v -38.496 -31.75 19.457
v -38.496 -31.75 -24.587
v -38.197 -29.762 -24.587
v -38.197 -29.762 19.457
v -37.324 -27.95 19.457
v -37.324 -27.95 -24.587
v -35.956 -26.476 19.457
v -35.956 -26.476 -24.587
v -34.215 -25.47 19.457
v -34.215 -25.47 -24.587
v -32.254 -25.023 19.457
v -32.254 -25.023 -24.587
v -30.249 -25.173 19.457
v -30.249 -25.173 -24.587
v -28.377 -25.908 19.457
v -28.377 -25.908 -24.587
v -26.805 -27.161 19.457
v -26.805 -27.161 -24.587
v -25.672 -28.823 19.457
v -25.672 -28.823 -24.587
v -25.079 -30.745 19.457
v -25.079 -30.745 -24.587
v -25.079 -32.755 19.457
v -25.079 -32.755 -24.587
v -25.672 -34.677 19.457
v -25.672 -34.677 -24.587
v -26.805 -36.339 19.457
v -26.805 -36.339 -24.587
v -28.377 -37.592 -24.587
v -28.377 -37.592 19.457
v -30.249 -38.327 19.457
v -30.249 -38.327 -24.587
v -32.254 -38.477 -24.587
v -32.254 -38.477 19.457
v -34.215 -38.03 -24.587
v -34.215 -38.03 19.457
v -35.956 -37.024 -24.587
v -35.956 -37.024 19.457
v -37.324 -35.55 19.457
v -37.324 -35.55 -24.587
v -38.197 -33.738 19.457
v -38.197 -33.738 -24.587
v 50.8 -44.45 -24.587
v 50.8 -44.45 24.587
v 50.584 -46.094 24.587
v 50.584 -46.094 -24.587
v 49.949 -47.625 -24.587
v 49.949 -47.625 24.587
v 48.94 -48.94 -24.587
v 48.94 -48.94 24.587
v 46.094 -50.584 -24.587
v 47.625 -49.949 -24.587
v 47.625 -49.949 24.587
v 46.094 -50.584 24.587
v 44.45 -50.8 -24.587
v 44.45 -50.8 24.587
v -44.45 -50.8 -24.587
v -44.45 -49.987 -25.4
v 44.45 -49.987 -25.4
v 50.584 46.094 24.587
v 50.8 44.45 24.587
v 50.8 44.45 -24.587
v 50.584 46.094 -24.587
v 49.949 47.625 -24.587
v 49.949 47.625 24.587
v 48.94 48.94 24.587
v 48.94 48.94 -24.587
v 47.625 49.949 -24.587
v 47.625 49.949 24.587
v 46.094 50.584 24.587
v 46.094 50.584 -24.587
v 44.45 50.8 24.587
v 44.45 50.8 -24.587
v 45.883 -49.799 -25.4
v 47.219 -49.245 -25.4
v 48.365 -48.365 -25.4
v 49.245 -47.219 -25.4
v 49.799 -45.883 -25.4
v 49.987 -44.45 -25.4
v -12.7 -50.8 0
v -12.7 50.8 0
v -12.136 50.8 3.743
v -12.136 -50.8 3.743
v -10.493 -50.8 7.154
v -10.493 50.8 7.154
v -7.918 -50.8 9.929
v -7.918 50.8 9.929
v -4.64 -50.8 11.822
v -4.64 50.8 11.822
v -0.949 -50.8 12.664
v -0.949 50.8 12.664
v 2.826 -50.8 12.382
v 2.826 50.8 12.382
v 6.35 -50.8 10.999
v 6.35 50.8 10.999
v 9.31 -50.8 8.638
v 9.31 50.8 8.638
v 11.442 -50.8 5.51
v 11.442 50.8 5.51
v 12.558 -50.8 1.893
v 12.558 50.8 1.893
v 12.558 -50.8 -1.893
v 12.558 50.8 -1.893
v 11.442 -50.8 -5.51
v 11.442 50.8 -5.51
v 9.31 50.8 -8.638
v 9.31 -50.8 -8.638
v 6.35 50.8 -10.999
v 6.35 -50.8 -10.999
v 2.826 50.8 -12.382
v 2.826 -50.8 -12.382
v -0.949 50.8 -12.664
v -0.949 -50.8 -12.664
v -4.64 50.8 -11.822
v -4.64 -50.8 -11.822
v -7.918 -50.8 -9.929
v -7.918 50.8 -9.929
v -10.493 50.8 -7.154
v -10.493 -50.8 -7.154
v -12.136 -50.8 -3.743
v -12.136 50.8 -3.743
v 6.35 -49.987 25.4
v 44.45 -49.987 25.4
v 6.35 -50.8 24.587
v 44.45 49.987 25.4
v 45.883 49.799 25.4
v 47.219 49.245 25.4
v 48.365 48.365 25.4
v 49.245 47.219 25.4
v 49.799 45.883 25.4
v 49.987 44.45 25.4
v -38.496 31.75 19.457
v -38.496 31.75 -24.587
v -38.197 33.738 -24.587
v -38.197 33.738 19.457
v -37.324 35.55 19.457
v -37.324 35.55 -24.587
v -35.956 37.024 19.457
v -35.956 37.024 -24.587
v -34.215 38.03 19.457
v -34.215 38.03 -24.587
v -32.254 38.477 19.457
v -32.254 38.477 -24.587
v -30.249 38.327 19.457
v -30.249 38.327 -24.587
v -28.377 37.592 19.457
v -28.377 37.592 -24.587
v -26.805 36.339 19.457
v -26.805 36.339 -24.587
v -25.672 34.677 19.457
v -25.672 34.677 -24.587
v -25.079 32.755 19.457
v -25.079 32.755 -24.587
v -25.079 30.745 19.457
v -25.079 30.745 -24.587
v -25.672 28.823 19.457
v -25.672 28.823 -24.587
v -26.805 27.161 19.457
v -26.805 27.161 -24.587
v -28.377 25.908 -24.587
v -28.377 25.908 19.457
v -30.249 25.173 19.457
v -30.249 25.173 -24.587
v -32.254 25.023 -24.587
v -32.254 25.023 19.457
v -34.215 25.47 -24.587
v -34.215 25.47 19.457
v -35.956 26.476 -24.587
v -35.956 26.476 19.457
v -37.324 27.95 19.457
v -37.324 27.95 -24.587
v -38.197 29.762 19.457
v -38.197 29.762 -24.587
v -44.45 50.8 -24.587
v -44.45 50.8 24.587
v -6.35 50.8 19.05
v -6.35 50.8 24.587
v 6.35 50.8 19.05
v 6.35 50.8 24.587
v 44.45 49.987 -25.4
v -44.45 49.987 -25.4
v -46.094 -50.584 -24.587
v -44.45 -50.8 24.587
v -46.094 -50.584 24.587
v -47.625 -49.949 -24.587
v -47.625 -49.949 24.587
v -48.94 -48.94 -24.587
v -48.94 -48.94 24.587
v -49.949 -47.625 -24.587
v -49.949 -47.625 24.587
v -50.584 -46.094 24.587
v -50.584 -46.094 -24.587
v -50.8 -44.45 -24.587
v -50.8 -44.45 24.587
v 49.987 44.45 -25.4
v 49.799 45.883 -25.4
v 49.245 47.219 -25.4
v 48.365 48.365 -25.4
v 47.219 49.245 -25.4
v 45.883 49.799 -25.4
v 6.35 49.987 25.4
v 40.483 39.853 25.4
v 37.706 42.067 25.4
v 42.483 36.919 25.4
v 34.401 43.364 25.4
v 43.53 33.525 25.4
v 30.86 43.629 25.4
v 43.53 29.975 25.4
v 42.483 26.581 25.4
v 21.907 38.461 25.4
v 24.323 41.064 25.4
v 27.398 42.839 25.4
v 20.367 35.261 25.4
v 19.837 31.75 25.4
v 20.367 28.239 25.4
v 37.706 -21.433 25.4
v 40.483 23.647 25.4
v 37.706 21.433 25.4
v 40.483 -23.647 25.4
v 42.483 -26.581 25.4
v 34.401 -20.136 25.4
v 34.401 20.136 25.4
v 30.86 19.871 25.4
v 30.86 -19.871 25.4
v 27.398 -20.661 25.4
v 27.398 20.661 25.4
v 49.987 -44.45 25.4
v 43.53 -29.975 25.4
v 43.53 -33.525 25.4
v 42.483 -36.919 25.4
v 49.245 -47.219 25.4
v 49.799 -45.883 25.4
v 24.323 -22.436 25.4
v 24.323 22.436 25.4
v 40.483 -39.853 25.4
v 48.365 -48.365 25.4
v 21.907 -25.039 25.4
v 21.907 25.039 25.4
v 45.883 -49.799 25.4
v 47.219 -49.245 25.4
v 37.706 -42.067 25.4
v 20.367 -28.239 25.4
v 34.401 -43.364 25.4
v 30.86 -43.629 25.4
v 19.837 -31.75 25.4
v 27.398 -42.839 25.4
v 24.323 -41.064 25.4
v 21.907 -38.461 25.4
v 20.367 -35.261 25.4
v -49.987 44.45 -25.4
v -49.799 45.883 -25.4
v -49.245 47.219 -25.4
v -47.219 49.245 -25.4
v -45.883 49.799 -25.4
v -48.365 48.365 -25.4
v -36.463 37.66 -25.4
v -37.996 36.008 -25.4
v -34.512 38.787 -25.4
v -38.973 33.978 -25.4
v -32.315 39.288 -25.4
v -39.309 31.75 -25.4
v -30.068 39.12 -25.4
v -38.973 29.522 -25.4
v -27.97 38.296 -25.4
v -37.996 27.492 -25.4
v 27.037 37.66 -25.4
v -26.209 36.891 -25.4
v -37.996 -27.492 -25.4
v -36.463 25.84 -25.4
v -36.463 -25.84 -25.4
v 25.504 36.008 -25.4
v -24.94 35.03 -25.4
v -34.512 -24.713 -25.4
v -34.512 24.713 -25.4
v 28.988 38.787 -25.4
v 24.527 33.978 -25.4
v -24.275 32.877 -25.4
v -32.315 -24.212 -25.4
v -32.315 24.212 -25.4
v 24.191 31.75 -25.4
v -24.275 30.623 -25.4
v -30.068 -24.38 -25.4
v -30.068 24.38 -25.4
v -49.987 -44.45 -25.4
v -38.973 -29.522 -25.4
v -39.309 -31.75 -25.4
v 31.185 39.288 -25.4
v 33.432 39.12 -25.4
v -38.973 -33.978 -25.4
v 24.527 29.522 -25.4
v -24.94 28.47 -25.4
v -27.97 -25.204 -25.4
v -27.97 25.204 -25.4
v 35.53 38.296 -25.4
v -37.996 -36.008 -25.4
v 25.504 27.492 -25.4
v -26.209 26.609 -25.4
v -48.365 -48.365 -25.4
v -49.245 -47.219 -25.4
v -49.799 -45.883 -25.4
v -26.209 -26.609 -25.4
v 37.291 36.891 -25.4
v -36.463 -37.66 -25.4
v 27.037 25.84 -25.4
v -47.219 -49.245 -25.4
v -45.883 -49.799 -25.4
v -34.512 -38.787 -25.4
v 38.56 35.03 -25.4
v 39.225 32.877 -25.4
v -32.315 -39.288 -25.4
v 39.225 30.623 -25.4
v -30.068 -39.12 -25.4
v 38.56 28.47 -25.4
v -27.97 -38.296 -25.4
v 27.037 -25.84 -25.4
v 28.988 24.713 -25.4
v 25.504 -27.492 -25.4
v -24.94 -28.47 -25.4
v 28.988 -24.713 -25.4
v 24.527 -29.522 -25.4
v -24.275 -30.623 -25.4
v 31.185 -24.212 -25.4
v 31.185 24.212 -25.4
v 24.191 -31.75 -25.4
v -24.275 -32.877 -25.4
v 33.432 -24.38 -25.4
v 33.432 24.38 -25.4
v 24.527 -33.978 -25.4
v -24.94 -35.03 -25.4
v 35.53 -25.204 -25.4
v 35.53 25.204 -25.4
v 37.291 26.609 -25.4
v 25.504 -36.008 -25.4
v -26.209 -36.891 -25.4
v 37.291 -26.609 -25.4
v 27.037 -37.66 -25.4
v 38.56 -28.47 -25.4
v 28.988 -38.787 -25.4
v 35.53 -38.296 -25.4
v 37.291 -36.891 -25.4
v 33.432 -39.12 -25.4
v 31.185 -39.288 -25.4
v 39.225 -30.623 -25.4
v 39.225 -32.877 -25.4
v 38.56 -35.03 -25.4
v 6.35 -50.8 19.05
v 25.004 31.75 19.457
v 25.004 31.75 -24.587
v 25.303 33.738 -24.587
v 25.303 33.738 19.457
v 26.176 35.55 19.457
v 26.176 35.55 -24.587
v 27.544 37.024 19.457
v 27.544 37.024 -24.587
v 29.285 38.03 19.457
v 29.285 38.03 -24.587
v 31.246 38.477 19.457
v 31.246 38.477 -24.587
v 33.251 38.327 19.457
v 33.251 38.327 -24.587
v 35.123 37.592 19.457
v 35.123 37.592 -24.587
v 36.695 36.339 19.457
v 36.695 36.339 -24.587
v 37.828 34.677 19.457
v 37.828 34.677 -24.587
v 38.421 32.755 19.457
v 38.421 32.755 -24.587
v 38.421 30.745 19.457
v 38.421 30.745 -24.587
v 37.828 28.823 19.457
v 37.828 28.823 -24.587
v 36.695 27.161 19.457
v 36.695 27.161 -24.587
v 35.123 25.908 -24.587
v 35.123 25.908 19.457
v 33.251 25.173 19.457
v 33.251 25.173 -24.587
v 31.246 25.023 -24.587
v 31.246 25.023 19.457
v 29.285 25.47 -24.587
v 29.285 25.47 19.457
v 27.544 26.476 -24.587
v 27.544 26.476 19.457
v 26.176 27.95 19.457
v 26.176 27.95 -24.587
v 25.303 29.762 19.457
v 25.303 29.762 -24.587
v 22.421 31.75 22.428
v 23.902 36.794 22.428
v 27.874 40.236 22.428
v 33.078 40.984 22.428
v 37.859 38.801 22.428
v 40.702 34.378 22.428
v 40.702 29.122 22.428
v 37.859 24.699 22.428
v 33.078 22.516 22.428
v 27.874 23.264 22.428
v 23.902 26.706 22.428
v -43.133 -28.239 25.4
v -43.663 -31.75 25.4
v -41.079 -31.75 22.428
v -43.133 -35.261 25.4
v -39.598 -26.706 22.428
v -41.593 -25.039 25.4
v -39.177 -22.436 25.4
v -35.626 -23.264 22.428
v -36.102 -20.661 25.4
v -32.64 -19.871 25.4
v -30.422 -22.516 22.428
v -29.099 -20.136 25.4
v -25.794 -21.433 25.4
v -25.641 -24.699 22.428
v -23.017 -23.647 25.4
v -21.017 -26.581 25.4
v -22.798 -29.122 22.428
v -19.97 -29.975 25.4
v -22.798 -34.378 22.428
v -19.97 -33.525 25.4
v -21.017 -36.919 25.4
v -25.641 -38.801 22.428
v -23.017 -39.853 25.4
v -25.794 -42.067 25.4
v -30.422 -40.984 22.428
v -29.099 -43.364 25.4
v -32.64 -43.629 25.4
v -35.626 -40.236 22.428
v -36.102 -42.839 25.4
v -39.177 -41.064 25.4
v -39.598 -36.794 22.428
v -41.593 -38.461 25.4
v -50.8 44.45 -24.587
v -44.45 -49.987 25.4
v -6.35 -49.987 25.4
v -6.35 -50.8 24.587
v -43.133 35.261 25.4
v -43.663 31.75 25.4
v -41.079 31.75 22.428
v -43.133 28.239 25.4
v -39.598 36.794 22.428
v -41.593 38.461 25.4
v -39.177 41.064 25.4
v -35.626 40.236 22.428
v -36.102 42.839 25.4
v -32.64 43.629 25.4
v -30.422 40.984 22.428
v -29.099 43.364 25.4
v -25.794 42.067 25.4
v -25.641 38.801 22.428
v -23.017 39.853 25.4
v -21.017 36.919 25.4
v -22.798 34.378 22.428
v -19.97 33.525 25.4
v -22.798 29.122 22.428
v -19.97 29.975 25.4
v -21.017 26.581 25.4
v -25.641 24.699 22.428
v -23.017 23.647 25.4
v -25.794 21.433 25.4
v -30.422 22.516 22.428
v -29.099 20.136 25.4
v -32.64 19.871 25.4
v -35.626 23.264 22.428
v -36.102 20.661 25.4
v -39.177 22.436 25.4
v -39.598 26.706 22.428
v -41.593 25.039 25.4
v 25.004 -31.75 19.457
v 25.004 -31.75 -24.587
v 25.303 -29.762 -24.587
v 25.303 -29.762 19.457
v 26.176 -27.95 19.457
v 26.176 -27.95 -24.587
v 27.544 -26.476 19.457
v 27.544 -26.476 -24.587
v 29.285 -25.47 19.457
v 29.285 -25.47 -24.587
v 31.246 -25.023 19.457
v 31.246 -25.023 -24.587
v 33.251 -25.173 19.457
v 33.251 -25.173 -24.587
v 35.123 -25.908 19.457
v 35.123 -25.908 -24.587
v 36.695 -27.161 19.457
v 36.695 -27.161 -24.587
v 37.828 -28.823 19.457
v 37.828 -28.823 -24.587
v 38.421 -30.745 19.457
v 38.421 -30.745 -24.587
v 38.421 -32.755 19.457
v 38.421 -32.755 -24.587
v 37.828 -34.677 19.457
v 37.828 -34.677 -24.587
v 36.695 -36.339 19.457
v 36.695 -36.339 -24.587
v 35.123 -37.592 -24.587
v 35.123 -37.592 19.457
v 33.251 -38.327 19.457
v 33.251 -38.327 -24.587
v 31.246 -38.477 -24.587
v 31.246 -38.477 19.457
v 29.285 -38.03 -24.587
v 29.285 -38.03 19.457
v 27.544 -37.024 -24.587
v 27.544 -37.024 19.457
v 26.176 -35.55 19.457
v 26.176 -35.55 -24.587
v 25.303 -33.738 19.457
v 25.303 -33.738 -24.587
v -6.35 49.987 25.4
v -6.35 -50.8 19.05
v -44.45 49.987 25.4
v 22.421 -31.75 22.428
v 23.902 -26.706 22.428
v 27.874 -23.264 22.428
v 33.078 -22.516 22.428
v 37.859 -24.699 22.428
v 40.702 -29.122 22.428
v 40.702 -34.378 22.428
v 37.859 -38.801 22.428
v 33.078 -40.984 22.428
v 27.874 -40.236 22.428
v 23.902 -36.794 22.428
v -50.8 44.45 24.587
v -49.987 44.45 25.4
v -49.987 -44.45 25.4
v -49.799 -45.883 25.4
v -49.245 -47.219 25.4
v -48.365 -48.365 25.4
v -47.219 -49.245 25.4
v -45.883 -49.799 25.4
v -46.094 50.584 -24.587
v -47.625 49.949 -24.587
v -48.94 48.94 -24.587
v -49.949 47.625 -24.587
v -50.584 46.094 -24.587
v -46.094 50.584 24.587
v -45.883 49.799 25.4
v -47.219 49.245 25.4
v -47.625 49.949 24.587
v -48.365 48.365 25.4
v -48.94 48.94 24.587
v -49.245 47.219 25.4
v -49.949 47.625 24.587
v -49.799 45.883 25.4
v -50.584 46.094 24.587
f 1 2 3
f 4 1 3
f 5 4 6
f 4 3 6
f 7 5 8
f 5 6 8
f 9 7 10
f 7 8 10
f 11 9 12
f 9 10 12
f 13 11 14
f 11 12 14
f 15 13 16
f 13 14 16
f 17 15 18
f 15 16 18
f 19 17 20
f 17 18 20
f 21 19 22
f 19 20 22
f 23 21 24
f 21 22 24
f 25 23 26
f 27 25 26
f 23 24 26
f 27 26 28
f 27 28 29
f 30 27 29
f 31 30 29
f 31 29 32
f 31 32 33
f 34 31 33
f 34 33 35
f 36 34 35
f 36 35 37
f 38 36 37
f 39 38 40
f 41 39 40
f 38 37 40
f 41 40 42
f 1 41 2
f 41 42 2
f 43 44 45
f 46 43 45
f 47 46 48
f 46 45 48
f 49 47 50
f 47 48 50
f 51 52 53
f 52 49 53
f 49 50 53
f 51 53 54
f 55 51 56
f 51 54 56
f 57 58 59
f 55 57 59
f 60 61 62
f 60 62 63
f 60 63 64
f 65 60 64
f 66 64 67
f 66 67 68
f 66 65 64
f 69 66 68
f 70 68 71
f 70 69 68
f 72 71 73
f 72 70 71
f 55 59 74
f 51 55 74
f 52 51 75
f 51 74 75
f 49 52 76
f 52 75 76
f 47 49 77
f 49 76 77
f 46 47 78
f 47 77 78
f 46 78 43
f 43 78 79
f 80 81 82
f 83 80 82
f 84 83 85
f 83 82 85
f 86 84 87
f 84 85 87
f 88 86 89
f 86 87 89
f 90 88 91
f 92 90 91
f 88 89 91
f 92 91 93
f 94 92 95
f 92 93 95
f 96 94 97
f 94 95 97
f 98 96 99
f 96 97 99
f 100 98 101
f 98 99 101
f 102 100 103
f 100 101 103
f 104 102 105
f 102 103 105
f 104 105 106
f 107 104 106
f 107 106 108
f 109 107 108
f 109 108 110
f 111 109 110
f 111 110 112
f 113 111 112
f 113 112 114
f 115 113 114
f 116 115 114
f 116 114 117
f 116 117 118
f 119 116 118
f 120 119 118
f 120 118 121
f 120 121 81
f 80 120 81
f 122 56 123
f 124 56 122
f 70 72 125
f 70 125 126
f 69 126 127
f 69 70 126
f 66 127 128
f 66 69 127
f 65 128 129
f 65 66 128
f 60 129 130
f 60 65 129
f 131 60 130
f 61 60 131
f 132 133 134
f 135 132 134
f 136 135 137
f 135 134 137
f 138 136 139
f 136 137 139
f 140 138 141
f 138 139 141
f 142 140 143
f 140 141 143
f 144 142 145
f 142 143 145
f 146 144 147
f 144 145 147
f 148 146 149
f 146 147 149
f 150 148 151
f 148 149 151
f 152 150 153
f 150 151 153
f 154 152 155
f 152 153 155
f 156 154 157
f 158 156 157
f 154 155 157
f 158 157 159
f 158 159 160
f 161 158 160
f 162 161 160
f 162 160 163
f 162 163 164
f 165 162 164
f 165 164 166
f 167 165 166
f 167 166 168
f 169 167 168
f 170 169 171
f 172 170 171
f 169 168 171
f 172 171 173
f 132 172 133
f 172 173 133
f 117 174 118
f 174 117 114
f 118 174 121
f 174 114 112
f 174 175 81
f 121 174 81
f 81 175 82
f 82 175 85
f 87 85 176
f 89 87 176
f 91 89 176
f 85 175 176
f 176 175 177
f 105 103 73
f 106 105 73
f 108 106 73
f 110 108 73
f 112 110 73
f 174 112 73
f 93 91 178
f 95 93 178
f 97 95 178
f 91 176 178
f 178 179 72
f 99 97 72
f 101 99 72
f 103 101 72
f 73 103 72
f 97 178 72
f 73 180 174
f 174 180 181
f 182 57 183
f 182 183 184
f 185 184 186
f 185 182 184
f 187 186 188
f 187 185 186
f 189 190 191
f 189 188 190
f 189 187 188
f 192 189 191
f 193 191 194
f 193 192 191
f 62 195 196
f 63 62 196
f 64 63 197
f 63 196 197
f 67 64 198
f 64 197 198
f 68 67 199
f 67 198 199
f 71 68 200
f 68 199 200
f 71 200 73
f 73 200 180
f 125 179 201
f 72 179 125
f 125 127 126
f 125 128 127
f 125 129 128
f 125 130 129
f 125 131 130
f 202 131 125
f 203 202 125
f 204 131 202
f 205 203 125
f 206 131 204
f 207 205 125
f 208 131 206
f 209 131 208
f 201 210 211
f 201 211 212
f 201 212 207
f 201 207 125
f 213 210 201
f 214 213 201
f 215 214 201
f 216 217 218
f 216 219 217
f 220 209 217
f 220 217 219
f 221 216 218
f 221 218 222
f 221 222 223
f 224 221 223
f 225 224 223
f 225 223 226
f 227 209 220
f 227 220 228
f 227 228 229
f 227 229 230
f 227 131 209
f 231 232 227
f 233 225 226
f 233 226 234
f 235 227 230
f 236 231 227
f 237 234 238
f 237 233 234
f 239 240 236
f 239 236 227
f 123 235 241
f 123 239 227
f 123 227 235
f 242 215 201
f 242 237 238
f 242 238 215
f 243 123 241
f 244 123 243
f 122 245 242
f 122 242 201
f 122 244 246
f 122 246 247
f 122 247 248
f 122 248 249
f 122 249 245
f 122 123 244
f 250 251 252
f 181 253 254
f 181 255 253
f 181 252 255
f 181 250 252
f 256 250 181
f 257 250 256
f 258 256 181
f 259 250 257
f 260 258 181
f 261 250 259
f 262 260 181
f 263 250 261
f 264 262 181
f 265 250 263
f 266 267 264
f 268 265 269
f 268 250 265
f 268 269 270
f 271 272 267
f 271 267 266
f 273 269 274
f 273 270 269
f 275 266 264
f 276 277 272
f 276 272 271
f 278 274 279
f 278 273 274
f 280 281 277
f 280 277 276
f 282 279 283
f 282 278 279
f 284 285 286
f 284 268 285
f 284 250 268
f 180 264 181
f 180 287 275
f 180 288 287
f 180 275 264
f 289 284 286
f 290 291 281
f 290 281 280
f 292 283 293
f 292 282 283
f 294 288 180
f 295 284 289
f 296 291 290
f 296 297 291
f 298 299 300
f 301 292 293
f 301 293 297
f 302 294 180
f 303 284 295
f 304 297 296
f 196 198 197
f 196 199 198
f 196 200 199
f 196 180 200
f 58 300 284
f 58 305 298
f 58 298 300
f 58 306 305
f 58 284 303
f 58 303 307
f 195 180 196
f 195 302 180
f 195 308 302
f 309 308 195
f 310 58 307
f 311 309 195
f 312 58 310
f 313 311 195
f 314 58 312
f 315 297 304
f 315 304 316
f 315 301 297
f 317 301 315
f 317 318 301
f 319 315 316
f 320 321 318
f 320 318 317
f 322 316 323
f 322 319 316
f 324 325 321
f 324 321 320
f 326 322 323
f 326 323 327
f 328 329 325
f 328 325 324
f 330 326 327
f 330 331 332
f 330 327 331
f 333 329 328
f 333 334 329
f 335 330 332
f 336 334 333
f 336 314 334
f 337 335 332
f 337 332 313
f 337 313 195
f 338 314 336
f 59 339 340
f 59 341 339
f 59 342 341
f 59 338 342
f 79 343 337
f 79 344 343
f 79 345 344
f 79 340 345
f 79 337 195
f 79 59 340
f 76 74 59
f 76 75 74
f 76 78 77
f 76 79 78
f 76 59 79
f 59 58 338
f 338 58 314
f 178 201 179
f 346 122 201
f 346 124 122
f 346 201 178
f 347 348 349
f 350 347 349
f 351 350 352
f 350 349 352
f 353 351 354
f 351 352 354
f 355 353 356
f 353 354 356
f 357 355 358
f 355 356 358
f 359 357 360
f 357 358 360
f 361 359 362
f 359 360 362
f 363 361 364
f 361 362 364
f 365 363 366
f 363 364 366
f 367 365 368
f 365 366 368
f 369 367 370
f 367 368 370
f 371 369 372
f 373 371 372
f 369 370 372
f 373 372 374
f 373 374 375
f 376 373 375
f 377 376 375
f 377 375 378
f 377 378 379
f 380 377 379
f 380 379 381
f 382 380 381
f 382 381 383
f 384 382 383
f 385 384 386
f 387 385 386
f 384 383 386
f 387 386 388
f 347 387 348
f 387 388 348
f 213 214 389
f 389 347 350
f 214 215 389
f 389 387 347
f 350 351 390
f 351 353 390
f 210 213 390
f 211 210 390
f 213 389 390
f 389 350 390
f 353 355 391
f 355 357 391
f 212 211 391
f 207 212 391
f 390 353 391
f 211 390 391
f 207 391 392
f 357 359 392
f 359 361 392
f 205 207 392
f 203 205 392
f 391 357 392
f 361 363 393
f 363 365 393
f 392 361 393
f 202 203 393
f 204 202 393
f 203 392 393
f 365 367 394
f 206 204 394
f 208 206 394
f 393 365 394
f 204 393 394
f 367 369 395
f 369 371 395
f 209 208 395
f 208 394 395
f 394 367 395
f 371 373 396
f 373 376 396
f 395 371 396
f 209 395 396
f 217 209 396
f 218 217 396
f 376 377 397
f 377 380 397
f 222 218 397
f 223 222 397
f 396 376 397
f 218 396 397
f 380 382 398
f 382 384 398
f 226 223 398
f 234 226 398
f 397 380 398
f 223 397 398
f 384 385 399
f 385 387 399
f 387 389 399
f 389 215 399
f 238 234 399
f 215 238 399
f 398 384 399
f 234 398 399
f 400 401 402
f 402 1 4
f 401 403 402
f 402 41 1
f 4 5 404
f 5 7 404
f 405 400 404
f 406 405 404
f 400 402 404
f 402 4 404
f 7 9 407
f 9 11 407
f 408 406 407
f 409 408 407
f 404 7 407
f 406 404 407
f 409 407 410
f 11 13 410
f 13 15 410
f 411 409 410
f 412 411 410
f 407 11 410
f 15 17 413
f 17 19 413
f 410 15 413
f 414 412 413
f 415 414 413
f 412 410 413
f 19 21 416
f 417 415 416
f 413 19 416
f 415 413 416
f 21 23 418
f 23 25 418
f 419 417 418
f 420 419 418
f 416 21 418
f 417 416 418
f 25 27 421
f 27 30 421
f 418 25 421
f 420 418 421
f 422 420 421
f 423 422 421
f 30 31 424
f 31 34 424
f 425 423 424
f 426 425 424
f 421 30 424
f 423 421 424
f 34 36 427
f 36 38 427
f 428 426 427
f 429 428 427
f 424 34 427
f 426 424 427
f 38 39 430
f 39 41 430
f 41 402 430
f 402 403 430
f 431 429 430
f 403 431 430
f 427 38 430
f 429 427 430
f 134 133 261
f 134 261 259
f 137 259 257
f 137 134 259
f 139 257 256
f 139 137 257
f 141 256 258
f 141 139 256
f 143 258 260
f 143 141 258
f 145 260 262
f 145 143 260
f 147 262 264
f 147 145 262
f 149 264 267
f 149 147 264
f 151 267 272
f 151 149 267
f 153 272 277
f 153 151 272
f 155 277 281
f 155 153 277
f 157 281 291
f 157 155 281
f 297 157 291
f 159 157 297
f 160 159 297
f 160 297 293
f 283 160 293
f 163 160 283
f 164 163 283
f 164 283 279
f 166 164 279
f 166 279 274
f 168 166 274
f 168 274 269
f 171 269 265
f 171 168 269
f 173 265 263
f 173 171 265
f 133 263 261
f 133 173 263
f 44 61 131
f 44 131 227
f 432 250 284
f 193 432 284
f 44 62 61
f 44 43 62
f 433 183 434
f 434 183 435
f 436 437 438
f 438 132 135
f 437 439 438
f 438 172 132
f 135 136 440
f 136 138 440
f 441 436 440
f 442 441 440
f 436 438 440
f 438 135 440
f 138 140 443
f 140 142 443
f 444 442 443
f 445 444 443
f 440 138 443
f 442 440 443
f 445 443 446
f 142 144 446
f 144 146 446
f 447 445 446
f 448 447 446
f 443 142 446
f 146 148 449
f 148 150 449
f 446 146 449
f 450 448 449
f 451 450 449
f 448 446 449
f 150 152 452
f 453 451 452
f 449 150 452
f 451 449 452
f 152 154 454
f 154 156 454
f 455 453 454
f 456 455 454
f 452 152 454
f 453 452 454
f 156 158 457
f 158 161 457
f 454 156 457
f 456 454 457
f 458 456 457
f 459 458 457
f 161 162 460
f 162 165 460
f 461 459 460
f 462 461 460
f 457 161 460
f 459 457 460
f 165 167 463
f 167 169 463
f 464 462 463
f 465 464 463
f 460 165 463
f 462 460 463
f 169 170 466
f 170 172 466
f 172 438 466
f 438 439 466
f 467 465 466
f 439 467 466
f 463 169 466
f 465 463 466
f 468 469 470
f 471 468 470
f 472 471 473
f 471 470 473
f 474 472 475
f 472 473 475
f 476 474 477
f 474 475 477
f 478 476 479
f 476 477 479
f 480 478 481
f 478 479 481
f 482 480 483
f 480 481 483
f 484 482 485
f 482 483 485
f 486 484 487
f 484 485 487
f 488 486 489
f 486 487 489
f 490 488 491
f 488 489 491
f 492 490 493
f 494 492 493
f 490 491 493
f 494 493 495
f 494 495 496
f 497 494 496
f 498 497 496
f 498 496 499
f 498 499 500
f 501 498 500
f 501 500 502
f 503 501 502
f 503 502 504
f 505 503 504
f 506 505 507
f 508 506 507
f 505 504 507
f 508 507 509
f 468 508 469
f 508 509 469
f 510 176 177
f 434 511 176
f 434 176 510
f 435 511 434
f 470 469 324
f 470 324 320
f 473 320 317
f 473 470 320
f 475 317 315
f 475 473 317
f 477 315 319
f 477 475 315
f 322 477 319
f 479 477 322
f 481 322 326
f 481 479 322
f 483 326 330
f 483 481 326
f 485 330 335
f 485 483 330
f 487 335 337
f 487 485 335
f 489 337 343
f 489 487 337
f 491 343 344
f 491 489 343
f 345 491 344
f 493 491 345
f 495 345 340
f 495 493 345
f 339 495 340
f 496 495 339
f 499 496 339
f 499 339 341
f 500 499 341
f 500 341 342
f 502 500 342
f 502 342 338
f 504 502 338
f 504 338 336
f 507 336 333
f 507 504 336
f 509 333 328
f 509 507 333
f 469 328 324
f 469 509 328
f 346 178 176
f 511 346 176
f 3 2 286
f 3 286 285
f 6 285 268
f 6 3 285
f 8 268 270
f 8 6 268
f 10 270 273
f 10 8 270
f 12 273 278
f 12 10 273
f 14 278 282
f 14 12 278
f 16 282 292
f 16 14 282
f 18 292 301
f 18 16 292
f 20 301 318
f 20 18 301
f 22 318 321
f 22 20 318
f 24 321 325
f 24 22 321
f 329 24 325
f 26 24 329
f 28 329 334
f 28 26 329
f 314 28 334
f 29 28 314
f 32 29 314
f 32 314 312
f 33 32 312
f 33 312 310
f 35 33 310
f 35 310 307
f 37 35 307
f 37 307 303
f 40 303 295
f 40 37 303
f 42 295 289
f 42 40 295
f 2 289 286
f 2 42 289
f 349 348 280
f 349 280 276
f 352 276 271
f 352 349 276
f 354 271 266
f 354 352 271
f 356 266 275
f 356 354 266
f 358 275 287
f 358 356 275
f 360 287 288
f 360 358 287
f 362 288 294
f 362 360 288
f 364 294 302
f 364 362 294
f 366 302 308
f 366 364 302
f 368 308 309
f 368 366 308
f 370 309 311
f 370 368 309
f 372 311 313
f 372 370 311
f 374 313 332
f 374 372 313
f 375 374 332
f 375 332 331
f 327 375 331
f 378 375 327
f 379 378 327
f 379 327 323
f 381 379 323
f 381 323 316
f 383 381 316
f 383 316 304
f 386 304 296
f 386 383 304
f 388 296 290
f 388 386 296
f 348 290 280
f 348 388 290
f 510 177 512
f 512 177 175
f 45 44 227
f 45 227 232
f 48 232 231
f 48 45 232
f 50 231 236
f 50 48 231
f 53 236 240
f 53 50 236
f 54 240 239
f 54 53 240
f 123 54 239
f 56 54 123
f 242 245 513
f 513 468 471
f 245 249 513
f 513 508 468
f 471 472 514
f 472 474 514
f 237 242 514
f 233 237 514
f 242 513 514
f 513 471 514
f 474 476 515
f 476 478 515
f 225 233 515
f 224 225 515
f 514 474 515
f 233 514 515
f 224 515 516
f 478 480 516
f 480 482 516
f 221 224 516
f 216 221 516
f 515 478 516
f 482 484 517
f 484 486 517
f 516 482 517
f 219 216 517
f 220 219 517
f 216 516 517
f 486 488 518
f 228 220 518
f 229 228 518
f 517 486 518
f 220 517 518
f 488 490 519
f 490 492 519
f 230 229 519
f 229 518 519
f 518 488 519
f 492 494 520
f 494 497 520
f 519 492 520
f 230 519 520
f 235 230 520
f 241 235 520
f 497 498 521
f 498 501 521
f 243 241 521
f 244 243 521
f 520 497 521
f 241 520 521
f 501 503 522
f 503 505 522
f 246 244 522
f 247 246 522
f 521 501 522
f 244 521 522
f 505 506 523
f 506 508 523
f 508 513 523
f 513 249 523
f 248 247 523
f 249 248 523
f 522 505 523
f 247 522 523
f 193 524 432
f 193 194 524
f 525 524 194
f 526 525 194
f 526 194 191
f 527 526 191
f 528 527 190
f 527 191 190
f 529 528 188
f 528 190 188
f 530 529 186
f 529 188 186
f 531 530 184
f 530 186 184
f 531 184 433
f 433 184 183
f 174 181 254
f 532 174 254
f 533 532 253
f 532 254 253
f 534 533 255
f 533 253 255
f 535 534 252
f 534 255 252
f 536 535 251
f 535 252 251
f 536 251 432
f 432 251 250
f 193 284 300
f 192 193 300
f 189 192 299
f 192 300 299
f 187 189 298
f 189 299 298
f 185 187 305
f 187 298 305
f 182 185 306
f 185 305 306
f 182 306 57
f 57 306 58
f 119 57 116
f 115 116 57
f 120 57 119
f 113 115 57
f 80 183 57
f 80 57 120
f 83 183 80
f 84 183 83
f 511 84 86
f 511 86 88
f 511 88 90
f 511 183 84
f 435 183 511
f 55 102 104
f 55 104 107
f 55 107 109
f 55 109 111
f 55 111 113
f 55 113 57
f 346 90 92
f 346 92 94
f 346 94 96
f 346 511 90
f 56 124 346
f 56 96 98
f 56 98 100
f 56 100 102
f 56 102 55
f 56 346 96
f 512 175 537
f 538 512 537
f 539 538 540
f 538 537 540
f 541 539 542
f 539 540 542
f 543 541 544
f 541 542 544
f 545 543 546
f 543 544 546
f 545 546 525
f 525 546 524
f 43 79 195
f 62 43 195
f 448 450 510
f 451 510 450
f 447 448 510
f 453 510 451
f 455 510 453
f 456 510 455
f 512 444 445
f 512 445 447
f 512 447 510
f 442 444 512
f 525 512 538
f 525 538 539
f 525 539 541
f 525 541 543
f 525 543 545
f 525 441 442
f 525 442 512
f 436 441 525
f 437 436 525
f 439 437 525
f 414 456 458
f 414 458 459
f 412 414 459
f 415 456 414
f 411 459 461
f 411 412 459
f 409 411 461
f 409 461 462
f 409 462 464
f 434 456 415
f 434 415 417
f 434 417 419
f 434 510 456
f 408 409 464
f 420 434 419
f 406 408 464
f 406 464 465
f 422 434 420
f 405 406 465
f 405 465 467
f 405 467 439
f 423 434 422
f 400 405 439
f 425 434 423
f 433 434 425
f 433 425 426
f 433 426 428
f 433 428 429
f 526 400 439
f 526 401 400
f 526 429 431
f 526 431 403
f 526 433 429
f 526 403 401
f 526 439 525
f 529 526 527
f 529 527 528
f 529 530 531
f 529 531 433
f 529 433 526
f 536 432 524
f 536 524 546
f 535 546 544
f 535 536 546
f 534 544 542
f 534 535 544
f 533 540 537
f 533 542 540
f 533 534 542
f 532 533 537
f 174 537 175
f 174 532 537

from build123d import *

# Parameters (mm, degrees)
F1_DEPTH       = 50.8
F3_D           = 13.49248
F3_CSINK_D     = 23.8252
F3_CSINK_ANGLE = 82
F4_R           = 6.35
F5_SIZE        = 0.8128
F7_D           = 25.4


with BuildPart() as f1:
    # F0 (on Front) → F1 (new body, symmetric)
    with BuildSketch(Plane.XZ):
        Polygon((-6.35, 25.4), (-50.8, 25.4), (-50.8, -25.4), (50.8, -25.4), (50.8, 25.4), (6.35, 25.4), (6.35, 19.05), (0, 19.05), (-6.35, 19.05), align=None)
    extrude(amount=F1_DEPTH, both=True)

    # F3 (through all)
    with Locations(Plane.XY.offset(25.4)):
        with Locations((-31.75, 31.75), (31.75, 31.75), (-31.75, -31.75), (31.75, -31.75)):
            CounterSinkHole(F3_D / 2, F3_CSINK_D / 2, counter_sink_angle=F3_CSINK_ANGLE)

    # F4
    f4_edges = [f1.edges().sort_by_distance(p)[0] for p in [
        (-50.8, 50.8, 0),
        (-50.8, -50.8, 0),
        (50.8, -50.8, 0),
        (50.8, 50.8, 0),
    ]]
    fillet(f4_edges, radius=F4_R)

    # F5
    f5_edges = [f1.edges().sort_by_distance(p)[0] for p in [
        (50.8, 0, 25.4),
        (-25.4, 50.8, 25.4),
        (25.4, 50.8, 25.4),
        (-50.8, 0, 25.4),
        (-25.4, -50.8, 25.4),
        (25.4, -50.8, 25.4),
        (-50.8, 0, -25.4),
        (-48.940128, 48.940128, -25.4),
        (-48.940128, -48.940128, -25.4),
        (0, 50.8, -25.4),
        (0, -50.8, -25.4),
        (48.940128, 48.940128, -25.4),
        (48.940128, -48.940128, -25.4),
        (50.8, 0, -25.4),
        (-38.49624, 31.75, -25.4),
        (25.00376, 31.75, -25.4),
        (-38.49624, -31.75, -25.4),
        (25.00376, -31.75, -25.4),
    ]]
    chamfer(f5_edges, length=F5_SIZE)

    # F7 (through all)
    with Locations(Plane.XZ.offset(50.8)):
        with Locations((0, 0)):
            Hole(F7_D / 2)


solid = f1.part
